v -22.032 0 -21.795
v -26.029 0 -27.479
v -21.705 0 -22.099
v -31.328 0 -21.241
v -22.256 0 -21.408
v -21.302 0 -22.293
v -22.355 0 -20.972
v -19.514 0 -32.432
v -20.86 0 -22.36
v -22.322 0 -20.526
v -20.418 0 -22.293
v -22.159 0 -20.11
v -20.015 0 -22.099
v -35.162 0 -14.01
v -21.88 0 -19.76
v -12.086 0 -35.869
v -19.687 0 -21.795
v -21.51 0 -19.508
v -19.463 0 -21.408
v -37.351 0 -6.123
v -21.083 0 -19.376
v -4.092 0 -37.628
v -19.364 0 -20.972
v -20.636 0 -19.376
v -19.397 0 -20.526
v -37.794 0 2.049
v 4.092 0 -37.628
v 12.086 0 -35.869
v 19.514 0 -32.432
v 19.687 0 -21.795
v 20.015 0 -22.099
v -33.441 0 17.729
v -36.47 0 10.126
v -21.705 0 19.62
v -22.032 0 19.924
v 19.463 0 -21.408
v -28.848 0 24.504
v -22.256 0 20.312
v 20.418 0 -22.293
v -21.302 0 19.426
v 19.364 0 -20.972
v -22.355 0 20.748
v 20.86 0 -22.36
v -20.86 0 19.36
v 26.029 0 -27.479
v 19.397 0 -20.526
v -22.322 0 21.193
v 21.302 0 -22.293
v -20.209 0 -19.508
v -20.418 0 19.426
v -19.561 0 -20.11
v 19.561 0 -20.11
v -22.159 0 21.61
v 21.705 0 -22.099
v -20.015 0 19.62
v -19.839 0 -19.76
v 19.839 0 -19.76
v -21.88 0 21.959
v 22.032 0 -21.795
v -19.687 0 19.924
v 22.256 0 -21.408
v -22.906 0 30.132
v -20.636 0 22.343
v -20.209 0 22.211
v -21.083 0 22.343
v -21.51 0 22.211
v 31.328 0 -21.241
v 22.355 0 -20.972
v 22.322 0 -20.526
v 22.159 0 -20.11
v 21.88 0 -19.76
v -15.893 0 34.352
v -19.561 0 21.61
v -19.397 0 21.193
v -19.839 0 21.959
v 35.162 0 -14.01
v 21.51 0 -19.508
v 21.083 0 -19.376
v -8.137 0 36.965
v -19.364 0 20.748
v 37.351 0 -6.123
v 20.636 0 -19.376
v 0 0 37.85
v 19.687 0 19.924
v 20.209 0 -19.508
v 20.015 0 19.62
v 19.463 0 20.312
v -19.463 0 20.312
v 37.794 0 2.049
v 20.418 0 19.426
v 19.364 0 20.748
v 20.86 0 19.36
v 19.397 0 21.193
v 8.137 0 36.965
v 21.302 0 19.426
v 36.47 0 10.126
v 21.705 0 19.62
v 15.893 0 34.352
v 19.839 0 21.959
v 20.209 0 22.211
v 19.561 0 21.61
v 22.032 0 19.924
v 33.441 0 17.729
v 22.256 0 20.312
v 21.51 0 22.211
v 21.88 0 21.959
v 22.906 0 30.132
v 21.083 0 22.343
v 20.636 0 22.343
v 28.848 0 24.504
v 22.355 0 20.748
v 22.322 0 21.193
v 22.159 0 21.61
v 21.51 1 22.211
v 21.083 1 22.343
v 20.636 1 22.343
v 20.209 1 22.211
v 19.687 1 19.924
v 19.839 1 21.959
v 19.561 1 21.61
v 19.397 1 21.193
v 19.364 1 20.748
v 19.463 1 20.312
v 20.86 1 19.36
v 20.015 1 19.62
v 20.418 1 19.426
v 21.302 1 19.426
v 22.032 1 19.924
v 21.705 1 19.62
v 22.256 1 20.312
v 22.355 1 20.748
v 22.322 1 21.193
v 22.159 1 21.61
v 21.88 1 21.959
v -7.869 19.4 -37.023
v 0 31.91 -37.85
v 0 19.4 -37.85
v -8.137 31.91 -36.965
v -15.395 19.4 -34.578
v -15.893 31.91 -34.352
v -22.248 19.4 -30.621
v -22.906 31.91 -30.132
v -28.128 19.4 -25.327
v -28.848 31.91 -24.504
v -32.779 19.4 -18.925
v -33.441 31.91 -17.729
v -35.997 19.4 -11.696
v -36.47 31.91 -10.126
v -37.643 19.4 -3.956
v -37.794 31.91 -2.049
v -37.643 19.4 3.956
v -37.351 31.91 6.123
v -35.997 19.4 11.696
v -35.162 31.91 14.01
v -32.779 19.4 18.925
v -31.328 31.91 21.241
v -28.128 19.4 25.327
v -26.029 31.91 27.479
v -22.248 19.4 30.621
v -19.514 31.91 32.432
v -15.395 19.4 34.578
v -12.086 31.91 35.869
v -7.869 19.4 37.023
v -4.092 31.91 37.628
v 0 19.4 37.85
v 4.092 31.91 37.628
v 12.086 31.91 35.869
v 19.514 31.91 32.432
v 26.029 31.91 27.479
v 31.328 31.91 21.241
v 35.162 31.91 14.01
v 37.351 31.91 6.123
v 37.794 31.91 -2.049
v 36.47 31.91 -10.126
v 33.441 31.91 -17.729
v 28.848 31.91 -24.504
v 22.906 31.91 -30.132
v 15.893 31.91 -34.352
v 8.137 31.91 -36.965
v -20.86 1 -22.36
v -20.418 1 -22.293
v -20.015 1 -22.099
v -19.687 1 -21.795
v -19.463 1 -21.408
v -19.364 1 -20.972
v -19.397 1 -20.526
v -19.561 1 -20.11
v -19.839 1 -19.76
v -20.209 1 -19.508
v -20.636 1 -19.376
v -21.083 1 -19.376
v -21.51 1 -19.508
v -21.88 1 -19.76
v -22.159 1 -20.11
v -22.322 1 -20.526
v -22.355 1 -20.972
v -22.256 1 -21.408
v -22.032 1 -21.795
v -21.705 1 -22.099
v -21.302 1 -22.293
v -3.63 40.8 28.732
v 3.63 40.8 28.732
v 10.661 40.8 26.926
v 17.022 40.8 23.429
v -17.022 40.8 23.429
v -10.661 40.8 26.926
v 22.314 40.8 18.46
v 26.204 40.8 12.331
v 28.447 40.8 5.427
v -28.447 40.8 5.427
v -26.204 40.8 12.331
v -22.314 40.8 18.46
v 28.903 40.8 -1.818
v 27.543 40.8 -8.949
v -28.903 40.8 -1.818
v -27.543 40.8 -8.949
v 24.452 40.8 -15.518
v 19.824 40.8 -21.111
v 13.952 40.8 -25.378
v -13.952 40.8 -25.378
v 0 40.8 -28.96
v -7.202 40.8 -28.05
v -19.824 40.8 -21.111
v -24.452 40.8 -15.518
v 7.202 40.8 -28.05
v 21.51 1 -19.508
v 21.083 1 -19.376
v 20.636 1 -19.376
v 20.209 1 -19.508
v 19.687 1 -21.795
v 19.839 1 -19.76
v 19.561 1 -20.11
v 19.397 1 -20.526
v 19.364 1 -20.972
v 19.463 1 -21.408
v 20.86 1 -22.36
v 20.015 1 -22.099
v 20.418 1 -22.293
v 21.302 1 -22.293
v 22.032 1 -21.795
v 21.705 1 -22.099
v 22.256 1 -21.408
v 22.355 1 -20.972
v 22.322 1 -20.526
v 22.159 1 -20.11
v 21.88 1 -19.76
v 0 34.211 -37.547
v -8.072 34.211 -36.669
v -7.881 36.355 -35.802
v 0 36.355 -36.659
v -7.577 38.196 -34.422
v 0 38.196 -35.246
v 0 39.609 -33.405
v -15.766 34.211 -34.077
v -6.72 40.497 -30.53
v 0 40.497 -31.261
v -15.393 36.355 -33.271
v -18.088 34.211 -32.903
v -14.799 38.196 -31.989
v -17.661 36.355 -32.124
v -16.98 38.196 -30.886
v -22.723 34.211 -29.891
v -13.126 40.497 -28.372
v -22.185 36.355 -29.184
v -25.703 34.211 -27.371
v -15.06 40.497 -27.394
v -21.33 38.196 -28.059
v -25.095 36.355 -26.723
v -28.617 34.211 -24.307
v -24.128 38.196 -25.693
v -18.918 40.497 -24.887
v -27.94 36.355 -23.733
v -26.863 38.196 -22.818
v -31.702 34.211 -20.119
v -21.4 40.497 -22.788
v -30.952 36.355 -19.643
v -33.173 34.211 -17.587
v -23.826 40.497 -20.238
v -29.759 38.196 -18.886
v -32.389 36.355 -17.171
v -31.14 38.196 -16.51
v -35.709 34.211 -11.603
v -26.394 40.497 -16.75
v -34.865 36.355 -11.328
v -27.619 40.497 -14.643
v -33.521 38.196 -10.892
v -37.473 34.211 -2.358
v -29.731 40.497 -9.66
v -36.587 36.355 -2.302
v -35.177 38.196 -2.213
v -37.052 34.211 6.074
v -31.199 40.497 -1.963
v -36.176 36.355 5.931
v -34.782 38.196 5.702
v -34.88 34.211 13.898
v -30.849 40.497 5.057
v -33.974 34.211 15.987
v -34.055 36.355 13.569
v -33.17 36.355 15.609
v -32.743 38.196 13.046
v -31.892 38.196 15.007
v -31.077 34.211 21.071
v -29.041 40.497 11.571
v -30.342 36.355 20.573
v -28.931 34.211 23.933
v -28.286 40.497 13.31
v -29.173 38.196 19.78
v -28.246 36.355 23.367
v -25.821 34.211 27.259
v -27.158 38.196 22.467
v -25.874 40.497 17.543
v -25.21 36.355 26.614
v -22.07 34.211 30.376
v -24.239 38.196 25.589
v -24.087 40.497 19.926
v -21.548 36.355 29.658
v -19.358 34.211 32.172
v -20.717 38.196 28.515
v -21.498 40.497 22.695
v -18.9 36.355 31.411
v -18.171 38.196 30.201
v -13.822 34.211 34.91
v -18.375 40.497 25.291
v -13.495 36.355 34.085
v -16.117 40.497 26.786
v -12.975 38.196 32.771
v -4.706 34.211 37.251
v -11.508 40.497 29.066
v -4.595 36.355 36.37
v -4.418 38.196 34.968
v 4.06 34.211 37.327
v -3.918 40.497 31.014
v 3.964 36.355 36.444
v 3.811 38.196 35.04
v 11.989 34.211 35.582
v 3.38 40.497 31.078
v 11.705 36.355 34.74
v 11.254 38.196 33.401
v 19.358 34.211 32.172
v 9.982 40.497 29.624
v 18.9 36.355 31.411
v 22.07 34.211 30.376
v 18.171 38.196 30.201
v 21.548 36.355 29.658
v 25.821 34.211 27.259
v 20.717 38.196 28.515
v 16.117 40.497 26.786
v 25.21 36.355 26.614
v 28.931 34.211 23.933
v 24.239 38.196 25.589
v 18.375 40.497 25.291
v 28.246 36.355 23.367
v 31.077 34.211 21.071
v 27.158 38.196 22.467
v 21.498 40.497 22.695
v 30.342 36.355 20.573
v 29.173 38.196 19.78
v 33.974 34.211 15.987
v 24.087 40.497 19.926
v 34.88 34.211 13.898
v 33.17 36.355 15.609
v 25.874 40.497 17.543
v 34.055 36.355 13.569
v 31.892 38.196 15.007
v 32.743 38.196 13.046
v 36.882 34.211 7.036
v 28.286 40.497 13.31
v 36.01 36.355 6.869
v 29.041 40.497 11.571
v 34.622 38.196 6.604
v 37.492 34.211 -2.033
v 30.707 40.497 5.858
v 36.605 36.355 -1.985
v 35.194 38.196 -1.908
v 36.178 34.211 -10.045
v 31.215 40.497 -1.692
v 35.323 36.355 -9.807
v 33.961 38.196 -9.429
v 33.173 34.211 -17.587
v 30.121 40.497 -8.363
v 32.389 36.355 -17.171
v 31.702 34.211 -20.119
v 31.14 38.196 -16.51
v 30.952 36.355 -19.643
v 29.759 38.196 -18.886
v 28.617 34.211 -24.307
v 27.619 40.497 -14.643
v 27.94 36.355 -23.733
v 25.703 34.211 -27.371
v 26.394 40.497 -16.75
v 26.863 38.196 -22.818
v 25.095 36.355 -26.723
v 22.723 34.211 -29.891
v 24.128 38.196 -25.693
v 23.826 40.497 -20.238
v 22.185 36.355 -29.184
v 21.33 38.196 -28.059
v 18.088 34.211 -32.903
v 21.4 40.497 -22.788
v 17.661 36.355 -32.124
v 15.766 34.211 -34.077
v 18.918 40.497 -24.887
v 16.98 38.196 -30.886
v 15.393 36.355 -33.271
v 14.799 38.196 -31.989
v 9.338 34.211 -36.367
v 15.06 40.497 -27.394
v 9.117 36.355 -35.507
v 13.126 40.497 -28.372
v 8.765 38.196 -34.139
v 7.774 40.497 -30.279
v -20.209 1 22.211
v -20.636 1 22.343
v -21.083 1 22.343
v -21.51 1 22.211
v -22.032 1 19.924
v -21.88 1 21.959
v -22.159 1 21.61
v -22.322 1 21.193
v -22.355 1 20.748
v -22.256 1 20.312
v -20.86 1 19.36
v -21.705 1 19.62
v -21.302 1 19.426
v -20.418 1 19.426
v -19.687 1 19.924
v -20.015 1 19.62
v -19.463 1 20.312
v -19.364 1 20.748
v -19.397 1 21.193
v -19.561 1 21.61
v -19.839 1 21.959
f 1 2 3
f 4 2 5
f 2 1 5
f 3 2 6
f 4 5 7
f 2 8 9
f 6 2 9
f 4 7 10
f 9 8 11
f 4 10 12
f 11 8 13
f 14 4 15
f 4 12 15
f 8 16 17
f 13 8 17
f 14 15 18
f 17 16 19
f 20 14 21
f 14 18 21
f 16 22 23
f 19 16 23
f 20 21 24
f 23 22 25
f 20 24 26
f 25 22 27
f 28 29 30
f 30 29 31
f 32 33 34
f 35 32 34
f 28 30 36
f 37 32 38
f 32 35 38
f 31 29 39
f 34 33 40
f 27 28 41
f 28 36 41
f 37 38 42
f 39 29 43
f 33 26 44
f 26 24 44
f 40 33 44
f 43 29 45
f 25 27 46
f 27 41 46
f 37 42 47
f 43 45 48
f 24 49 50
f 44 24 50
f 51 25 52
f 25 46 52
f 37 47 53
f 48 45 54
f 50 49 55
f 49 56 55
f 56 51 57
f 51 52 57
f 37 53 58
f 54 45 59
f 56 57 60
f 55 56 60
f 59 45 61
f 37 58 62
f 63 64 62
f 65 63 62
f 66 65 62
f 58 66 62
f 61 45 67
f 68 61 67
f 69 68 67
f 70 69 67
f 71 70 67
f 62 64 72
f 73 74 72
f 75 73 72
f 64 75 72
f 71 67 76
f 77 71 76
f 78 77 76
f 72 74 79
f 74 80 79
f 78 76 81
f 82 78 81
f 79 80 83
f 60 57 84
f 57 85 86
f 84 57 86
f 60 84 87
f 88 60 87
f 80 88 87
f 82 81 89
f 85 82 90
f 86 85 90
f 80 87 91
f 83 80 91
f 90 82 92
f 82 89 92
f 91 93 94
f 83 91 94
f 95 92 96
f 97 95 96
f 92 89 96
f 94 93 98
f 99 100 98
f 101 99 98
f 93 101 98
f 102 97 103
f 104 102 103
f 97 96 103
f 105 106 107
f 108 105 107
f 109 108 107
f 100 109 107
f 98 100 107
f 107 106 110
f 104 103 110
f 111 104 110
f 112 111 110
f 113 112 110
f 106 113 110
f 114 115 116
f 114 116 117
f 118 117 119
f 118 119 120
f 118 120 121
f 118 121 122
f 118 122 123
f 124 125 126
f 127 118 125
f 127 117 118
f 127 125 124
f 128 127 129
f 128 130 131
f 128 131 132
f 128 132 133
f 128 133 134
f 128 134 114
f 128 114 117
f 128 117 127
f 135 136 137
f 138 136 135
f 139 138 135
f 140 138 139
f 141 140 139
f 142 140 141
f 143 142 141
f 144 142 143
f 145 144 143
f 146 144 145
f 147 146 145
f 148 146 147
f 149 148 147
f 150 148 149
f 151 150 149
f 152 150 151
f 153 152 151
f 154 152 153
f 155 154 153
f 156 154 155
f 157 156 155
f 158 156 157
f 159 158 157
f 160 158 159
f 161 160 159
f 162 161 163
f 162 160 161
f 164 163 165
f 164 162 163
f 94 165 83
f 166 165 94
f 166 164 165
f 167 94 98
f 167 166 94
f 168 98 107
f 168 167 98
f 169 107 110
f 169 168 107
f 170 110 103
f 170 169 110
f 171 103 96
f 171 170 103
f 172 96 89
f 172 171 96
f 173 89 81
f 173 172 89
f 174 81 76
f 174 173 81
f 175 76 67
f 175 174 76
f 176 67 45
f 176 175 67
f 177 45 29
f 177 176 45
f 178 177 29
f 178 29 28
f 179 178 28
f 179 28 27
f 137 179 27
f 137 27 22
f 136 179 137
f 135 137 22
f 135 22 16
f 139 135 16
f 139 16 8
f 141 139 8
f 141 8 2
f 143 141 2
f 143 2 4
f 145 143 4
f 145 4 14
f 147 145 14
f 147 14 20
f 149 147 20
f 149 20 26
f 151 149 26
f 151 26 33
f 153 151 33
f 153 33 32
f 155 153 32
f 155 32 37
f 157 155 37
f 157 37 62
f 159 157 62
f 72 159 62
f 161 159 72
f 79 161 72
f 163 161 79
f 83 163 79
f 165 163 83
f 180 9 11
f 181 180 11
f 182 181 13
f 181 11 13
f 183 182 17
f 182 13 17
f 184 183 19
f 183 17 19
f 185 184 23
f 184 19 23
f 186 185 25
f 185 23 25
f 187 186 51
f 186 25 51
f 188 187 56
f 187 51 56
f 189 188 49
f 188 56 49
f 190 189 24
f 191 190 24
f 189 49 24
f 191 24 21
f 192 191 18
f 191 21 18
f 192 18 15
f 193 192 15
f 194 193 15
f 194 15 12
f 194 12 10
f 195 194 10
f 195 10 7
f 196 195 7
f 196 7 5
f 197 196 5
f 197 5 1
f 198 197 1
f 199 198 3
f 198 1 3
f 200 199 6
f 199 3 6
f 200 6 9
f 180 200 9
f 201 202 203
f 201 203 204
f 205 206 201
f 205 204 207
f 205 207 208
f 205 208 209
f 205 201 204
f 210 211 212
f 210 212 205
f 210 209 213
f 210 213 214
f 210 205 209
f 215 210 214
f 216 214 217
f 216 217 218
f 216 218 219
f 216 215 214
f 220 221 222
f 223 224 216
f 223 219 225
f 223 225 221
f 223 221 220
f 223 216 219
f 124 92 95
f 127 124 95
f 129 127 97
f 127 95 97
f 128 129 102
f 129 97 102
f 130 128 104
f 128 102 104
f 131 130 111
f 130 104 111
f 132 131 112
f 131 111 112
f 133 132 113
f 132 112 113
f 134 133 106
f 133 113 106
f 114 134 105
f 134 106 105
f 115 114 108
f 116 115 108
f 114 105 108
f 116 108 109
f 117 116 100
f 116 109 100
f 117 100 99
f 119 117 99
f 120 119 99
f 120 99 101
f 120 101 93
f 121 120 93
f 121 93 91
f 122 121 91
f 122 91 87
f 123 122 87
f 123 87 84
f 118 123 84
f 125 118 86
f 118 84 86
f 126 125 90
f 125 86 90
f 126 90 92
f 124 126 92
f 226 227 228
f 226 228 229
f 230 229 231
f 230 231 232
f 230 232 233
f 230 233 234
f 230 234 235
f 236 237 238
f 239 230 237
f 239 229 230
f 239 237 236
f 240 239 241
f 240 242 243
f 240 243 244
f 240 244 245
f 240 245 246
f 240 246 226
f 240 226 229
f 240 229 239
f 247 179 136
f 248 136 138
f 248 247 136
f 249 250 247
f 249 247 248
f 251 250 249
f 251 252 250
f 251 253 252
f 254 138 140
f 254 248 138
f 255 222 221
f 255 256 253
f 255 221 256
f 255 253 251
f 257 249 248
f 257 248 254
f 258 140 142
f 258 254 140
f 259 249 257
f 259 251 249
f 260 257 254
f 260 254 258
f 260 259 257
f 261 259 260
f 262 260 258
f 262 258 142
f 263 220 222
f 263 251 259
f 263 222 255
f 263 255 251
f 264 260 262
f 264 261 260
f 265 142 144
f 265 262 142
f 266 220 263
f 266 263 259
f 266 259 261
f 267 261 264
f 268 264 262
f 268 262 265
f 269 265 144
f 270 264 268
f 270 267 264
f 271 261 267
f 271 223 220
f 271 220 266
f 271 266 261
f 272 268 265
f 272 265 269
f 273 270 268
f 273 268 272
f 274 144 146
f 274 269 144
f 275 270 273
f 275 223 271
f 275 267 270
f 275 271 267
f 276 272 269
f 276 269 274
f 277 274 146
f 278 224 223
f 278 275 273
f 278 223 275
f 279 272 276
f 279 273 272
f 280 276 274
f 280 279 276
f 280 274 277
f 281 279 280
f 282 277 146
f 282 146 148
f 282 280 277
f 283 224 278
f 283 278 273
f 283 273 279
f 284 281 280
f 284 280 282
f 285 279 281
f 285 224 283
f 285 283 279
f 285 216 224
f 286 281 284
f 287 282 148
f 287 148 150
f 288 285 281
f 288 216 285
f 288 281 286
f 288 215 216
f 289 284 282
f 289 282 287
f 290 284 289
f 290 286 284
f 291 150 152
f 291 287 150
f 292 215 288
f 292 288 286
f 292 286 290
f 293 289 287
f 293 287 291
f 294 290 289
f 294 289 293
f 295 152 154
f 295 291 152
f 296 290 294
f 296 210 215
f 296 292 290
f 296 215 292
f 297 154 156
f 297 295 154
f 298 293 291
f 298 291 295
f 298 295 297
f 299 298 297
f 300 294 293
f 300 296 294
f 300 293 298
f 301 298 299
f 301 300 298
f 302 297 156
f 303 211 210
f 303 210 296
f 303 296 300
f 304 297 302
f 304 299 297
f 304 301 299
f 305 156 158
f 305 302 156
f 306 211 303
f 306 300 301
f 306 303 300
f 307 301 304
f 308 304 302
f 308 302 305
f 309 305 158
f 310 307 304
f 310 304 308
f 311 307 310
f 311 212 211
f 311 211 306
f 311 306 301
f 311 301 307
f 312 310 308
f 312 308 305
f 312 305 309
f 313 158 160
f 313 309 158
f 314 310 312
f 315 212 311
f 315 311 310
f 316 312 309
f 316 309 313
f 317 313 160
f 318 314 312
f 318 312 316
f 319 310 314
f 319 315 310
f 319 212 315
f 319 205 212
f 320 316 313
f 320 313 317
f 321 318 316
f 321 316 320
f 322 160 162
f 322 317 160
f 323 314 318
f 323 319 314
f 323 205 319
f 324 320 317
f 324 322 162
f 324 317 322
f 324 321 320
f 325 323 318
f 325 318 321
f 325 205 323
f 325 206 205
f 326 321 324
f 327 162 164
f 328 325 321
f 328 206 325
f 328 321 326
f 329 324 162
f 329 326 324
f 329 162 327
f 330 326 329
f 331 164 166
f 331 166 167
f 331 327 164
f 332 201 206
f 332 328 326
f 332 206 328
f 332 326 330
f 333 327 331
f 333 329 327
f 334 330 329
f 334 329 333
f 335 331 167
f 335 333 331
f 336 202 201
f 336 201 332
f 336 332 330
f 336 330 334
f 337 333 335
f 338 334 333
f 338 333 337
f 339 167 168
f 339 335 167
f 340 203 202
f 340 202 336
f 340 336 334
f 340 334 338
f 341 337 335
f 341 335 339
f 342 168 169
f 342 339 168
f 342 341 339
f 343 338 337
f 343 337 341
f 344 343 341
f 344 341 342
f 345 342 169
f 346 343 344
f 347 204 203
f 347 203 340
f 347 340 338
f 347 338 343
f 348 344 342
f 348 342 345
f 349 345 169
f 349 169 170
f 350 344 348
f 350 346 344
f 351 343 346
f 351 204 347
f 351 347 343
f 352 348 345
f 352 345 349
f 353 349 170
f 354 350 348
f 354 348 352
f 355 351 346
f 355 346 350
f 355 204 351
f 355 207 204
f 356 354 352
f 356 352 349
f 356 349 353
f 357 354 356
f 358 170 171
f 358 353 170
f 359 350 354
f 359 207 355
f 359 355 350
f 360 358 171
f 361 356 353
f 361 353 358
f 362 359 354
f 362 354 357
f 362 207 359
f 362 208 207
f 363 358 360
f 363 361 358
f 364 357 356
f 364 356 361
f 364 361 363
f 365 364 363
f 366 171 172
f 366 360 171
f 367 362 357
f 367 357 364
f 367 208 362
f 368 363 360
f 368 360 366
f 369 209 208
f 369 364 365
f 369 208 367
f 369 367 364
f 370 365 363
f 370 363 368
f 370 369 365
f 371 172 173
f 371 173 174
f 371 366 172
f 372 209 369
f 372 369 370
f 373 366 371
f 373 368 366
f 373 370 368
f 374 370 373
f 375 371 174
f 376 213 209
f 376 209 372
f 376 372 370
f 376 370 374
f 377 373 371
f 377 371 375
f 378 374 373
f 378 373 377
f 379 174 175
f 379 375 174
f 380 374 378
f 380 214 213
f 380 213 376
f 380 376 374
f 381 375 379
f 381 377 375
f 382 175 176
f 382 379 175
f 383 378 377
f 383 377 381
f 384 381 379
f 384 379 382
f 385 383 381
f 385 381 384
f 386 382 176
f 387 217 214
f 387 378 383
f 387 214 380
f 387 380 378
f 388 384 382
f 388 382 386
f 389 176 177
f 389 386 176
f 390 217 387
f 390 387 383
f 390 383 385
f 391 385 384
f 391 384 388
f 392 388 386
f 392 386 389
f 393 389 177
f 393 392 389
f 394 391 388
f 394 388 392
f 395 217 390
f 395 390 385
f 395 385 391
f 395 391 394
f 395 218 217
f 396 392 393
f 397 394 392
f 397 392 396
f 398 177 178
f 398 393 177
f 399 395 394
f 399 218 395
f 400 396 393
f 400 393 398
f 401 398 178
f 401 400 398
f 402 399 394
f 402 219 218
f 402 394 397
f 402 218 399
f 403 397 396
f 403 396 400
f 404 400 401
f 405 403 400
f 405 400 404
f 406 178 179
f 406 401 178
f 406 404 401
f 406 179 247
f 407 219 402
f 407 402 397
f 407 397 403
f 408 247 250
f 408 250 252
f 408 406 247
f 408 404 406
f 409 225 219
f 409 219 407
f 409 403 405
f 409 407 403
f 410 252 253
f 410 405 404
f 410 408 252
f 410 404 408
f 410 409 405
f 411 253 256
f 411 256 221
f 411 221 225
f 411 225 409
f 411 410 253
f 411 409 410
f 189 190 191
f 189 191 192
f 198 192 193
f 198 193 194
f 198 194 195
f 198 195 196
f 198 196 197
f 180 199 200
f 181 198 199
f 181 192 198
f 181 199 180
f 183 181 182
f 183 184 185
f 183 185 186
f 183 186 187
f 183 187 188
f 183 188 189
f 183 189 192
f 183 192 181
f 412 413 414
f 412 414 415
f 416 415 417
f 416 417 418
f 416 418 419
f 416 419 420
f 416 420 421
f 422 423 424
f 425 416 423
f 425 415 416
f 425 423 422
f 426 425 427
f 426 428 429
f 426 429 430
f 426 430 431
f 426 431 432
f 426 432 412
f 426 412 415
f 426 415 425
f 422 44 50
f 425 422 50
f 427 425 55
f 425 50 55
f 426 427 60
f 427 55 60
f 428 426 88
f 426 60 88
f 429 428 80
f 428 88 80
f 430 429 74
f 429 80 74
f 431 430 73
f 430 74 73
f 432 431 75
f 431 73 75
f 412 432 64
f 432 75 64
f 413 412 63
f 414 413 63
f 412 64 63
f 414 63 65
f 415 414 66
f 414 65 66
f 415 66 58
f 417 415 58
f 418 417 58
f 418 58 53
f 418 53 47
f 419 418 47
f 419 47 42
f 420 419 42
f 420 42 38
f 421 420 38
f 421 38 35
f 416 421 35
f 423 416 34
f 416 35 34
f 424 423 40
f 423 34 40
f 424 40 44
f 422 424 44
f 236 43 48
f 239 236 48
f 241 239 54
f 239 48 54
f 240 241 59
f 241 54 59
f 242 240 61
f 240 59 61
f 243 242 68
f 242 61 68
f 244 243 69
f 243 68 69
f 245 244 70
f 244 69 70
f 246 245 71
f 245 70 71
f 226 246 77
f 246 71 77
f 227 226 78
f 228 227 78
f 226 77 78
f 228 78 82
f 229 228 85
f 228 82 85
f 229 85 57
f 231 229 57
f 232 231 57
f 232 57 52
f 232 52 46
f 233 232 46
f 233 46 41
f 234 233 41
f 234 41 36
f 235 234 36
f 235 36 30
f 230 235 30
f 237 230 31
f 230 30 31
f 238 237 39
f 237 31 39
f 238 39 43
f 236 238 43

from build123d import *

# Parameters (mm, degrees)
SKETCH1_R           = 37.85
BOSS_EXTRUDE1_DEPTH = 19.4
SKETCH4_R           = 1.5
CUT_EXTRUDE1_DEPTH  = 1


with BuildPart() as part:
    # Sketch1 → Boss-Extrude1 (new body)
    with BuildSketch(Plane(origin=(0, 0, 0), x_dir=(1, 0, 0), z_dir=(0, 1, 0))):
        with Locations(Location((0, 0, 0), (0, 0, 270))):
            Circle(SKETCH1_R)
    extrude(amount=BOSS_EXTRUDE1_DEPTH)

    # Sketch3 → Revolve1 (revolve)
    with BuildSketch(Plane(origin=(0, 0, 0), x_dir=(0, 0, -1), z_dir=(1, 0, 0))):
        with BuildLine():
            Line((37.85, 19.4), (37.85, 30.8))
            Line((37.85, 30.8), (37.85, 31.91000006))
            ThreePointArc((37.85, 31.91000006), (35.246179285, 38.196179345), (28.96, 40.80000006))
            Line((28.96, 40.80000006), (0, 40.80000006))
            Line((0, 40.80000006), (0, 19.4))
            Line((0, 19.4), (37.85, 19.4))
        make_face()
    revolve(axis=Axis((0, 19.4, 0), (0, 1, 0)))

    # Sketch4 → Cut-Extrude1 (cut)
    with BuildSketch(Plane.XZ):
        with Locations(Location((20.859650045, 20.859650045, 0), (0, 0, 270))):
            Circle(SKETCH4_R)
        with Locations(Location((-20.859650045, 20.859650045, 0), (0, 0, 270))):
            Circle(SKETCH4_R)
        with Locations(Location((-20.859650045, -20.859650045, 0), (0, 0, 270))):
            Circle(SKETCH4_R)
        with Locations(Location((20.859650045, -20.859650045, 0), (0, 0, 270))):
            Circle(SKETCH4_R)
    extrude(amount=-CUT_EXTRUDE1_DEPTH, mode=Mode.SUBTRACT)


solid = part.part
